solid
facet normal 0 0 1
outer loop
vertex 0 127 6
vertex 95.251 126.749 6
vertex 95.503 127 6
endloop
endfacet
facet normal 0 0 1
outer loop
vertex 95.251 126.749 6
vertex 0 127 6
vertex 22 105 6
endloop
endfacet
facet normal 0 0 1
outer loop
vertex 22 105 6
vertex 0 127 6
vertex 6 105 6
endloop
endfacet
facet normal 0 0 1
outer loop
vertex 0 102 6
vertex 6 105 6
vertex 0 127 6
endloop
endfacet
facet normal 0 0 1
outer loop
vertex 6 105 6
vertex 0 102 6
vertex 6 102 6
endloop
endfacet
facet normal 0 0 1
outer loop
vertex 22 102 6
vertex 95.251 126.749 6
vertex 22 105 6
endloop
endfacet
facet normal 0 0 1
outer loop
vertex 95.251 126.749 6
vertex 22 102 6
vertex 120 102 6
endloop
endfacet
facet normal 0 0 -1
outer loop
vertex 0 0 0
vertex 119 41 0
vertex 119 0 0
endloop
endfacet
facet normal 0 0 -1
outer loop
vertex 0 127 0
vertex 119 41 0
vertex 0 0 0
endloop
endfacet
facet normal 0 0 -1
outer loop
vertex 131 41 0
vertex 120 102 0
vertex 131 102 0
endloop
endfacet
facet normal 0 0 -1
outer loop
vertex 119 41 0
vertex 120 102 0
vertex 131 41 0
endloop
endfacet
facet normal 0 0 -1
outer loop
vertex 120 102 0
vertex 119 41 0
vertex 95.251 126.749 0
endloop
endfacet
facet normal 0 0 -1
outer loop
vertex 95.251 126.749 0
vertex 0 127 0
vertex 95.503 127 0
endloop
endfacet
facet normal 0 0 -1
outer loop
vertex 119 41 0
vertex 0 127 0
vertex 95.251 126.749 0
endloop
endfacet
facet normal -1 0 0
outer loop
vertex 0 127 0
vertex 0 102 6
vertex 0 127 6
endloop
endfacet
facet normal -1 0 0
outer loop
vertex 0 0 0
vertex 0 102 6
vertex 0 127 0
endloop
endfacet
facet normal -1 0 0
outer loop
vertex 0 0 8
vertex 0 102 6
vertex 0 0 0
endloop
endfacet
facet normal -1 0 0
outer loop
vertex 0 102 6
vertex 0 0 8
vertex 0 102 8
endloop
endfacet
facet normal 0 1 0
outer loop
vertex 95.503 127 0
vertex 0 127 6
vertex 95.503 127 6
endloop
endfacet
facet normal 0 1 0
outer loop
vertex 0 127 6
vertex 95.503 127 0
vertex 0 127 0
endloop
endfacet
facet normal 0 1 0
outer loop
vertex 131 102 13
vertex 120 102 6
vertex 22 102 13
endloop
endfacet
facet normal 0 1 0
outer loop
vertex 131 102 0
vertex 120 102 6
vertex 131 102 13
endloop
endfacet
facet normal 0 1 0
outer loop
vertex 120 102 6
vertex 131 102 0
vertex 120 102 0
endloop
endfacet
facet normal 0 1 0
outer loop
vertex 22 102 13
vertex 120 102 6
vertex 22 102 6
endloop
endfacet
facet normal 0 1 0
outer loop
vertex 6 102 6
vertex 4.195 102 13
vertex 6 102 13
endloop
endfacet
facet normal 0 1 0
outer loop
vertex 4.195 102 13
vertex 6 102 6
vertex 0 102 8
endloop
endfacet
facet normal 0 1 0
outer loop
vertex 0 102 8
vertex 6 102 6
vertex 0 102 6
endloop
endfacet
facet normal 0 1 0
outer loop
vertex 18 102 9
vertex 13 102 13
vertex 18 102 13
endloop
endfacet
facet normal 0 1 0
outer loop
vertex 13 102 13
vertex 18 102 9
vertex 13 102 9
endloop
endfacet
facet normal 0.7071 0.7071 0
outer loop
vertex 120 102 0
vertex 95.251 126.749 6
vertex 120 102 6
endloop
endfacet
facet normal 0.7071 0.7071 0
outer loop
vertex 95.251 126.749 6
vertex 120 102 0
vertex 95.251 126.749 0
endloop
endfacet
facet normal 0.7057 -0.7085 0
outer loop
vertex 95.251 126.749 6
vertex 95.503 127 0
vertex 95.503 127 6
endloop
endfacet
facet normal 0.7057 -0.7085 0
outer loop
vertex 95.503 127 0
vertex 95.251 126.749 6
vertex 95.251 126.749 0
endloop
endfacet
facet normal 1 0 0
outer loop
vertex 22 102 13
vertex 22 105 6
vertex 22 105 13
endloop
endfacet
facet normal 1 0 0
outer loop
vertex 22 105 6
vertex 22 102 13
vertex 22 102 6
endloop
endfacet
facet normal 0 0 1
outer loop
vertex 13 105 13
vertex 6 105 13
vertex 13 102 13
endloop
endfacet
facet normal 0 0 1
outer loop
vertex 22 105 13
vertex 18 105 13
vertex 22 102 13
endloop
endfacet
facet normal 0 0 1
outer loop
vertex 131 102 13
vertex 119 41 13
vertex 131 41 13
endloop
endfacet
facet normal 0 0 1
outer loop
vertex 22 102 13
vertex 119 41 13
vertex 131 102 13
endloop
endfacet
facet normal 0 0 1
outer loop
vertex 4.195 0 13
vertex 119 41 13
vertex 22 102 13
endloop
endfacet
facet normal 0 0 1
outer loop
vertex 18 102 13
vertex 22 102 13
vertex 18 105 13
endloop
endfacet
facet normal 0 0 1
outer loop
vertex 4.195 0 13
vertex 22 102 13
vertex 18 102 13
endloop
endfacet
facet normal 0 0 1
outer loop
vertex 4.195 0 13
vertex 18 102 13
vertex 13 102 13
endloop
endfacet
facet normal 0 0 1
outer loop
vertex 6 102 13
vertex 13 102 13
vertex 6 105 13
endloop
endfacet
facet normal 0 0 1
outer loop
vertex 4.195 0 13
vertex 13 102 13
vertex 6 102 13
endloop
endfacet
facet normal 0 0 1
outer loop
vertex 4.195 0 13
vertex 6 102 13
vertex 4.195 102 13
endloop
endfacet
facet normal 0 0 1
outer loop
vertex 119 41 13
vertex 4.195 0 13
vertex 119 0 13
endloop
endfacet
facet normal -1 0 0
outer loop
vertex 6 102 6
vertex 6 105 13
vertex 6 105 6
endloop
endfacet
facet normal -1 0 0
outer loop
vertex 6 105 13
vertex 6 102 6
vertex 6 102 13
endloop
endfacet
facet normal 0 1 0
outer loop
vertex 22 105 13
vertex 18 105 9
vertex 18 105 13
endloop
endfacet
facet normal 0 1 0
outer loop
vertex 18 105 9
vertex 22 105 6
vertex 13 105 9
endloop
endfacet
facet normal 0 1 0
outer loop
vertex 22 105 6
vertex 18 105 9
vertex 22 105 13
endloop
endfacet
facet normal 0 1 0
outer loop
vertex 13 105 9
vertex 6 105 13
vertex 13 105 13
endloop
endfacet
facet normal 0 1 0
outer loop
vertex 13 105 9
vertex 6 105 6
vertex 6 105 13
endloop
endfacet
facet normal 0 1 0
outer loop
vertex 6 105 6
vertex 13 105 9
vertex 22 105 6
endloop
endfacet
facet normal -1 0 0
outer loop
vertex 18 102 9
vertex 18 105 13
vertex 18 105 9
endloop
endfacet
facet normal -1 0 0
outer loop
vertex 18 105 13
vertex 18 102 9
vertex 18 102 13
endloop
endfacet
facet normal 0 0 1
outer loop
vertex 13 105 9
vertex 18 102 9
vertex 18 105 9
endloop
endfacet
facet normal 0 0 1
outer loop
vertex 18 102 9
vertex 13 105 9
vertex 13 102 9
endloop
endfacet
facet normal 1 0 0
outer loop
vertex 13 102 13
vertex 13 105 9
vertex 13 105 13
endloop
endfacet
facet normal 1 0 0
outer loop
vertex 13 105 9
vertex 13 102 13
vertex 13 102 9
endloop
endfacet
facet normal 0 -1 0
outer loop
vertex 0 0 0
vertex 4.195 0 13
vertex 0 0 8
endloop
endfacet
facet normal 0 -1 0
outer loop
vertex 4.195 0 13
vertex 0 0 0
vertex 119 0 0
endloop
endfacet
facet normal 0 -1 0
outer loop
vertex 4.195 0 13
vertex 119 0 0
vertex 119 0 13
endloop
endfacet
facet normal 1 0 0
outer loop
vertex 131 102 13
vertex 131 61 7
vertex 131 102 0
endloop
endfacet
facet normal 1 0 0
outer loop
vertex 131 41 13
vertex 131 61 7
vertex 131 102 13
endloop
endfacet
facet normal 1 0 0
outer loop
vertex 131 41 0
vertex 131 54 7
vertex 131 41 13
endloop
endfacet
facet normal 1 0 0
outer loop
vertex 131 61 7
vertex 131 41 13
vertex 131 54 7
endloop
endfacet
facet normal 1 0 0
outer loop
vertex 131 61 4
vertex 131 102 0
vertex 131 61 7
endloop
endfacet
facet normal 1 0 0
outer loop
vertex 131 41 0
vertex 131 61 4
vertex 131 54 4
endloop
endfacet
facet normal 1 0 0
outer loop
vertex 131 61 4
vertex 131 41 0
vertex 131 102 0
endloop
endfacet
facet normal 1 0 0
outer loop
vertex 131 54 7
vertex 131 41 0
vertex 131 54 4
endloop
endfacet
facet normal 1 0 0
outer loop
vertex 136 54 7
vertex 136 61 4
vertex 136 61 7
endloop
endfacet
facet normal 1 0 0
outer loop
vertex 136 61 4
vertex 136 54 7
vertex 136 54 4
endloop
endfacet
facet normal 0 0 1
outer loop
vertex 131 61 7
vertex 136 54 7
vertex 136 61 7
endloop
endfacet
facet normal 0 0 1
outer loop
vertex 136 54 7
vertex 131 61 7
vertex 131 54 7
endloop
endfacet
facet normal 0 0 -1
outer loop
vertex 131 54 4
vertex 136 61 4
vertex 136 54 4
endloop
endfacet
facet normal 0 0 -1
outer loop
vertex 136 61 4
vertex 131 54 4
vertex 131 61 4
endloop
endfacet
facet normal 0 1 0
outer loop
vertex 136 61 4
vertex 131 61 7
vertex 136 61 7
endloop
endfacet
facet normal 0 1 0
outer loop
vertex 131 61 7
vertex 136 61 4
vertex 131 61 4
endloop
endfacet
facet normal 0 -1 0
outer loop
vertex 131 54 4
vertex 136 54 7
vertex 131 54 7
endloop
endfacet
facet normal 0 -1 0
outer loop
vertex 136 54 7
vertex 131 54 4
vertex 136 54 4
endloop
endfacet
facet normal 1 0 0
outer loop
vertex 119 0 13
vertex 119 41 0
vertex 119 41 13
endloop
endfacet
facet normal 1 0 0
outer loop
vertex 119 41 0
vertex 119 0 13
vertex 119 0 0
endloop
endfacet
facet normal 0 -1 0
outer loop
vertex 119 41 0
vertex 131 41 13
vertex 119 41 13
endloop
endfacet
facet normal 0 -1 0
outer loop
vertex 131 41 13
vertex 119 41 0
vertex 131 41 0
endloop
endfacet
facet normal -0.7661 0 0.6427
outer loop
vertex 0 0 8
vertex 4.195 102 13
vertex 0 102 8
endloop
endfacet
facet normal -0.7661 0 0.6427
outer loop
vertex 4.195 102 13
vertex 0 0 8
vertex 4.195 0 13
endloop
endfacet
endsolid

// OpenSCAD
intersection() {
//translate([5, -7, -1]) rotate(45, [0, 0, 1]) cube([100, 100, 100]);
//#translate([-1, -1, -1]) cube([30, 200, 50]);

#difference() {
union () {
 cube([6, 102, 13]);
 translate([6, 0, 0]) cube([131-6, 102, 13]);


translate([0, 102, 0]) {
	difference () {
		cube([120, 25, 6]);
		translate([120, 0, -1]) rotate(45, [0, 0, 1]) cube([35, 35, 8]);
	}
}
#translate([6, 102, 6]) difference() {
	cube([16, 3, 7]);	
	translate([7, 0, 3]) cube([5, 4, 5]);
}
translate([131, 54, 4]) cube([5, 7, 3]);
}

translate([131 - 12, -1, -1]) cube([13, 42, 15]);

#translate([0, -1, 8]) rotate(-50, [0, 1, 0]) cube([8, 104, 5]);
}
//# translate([-1, -1, -1]) cube([110, 110, 40]);
}
//# rotate(45, [0, 0, 1]) cube([100, 100, 100]);
